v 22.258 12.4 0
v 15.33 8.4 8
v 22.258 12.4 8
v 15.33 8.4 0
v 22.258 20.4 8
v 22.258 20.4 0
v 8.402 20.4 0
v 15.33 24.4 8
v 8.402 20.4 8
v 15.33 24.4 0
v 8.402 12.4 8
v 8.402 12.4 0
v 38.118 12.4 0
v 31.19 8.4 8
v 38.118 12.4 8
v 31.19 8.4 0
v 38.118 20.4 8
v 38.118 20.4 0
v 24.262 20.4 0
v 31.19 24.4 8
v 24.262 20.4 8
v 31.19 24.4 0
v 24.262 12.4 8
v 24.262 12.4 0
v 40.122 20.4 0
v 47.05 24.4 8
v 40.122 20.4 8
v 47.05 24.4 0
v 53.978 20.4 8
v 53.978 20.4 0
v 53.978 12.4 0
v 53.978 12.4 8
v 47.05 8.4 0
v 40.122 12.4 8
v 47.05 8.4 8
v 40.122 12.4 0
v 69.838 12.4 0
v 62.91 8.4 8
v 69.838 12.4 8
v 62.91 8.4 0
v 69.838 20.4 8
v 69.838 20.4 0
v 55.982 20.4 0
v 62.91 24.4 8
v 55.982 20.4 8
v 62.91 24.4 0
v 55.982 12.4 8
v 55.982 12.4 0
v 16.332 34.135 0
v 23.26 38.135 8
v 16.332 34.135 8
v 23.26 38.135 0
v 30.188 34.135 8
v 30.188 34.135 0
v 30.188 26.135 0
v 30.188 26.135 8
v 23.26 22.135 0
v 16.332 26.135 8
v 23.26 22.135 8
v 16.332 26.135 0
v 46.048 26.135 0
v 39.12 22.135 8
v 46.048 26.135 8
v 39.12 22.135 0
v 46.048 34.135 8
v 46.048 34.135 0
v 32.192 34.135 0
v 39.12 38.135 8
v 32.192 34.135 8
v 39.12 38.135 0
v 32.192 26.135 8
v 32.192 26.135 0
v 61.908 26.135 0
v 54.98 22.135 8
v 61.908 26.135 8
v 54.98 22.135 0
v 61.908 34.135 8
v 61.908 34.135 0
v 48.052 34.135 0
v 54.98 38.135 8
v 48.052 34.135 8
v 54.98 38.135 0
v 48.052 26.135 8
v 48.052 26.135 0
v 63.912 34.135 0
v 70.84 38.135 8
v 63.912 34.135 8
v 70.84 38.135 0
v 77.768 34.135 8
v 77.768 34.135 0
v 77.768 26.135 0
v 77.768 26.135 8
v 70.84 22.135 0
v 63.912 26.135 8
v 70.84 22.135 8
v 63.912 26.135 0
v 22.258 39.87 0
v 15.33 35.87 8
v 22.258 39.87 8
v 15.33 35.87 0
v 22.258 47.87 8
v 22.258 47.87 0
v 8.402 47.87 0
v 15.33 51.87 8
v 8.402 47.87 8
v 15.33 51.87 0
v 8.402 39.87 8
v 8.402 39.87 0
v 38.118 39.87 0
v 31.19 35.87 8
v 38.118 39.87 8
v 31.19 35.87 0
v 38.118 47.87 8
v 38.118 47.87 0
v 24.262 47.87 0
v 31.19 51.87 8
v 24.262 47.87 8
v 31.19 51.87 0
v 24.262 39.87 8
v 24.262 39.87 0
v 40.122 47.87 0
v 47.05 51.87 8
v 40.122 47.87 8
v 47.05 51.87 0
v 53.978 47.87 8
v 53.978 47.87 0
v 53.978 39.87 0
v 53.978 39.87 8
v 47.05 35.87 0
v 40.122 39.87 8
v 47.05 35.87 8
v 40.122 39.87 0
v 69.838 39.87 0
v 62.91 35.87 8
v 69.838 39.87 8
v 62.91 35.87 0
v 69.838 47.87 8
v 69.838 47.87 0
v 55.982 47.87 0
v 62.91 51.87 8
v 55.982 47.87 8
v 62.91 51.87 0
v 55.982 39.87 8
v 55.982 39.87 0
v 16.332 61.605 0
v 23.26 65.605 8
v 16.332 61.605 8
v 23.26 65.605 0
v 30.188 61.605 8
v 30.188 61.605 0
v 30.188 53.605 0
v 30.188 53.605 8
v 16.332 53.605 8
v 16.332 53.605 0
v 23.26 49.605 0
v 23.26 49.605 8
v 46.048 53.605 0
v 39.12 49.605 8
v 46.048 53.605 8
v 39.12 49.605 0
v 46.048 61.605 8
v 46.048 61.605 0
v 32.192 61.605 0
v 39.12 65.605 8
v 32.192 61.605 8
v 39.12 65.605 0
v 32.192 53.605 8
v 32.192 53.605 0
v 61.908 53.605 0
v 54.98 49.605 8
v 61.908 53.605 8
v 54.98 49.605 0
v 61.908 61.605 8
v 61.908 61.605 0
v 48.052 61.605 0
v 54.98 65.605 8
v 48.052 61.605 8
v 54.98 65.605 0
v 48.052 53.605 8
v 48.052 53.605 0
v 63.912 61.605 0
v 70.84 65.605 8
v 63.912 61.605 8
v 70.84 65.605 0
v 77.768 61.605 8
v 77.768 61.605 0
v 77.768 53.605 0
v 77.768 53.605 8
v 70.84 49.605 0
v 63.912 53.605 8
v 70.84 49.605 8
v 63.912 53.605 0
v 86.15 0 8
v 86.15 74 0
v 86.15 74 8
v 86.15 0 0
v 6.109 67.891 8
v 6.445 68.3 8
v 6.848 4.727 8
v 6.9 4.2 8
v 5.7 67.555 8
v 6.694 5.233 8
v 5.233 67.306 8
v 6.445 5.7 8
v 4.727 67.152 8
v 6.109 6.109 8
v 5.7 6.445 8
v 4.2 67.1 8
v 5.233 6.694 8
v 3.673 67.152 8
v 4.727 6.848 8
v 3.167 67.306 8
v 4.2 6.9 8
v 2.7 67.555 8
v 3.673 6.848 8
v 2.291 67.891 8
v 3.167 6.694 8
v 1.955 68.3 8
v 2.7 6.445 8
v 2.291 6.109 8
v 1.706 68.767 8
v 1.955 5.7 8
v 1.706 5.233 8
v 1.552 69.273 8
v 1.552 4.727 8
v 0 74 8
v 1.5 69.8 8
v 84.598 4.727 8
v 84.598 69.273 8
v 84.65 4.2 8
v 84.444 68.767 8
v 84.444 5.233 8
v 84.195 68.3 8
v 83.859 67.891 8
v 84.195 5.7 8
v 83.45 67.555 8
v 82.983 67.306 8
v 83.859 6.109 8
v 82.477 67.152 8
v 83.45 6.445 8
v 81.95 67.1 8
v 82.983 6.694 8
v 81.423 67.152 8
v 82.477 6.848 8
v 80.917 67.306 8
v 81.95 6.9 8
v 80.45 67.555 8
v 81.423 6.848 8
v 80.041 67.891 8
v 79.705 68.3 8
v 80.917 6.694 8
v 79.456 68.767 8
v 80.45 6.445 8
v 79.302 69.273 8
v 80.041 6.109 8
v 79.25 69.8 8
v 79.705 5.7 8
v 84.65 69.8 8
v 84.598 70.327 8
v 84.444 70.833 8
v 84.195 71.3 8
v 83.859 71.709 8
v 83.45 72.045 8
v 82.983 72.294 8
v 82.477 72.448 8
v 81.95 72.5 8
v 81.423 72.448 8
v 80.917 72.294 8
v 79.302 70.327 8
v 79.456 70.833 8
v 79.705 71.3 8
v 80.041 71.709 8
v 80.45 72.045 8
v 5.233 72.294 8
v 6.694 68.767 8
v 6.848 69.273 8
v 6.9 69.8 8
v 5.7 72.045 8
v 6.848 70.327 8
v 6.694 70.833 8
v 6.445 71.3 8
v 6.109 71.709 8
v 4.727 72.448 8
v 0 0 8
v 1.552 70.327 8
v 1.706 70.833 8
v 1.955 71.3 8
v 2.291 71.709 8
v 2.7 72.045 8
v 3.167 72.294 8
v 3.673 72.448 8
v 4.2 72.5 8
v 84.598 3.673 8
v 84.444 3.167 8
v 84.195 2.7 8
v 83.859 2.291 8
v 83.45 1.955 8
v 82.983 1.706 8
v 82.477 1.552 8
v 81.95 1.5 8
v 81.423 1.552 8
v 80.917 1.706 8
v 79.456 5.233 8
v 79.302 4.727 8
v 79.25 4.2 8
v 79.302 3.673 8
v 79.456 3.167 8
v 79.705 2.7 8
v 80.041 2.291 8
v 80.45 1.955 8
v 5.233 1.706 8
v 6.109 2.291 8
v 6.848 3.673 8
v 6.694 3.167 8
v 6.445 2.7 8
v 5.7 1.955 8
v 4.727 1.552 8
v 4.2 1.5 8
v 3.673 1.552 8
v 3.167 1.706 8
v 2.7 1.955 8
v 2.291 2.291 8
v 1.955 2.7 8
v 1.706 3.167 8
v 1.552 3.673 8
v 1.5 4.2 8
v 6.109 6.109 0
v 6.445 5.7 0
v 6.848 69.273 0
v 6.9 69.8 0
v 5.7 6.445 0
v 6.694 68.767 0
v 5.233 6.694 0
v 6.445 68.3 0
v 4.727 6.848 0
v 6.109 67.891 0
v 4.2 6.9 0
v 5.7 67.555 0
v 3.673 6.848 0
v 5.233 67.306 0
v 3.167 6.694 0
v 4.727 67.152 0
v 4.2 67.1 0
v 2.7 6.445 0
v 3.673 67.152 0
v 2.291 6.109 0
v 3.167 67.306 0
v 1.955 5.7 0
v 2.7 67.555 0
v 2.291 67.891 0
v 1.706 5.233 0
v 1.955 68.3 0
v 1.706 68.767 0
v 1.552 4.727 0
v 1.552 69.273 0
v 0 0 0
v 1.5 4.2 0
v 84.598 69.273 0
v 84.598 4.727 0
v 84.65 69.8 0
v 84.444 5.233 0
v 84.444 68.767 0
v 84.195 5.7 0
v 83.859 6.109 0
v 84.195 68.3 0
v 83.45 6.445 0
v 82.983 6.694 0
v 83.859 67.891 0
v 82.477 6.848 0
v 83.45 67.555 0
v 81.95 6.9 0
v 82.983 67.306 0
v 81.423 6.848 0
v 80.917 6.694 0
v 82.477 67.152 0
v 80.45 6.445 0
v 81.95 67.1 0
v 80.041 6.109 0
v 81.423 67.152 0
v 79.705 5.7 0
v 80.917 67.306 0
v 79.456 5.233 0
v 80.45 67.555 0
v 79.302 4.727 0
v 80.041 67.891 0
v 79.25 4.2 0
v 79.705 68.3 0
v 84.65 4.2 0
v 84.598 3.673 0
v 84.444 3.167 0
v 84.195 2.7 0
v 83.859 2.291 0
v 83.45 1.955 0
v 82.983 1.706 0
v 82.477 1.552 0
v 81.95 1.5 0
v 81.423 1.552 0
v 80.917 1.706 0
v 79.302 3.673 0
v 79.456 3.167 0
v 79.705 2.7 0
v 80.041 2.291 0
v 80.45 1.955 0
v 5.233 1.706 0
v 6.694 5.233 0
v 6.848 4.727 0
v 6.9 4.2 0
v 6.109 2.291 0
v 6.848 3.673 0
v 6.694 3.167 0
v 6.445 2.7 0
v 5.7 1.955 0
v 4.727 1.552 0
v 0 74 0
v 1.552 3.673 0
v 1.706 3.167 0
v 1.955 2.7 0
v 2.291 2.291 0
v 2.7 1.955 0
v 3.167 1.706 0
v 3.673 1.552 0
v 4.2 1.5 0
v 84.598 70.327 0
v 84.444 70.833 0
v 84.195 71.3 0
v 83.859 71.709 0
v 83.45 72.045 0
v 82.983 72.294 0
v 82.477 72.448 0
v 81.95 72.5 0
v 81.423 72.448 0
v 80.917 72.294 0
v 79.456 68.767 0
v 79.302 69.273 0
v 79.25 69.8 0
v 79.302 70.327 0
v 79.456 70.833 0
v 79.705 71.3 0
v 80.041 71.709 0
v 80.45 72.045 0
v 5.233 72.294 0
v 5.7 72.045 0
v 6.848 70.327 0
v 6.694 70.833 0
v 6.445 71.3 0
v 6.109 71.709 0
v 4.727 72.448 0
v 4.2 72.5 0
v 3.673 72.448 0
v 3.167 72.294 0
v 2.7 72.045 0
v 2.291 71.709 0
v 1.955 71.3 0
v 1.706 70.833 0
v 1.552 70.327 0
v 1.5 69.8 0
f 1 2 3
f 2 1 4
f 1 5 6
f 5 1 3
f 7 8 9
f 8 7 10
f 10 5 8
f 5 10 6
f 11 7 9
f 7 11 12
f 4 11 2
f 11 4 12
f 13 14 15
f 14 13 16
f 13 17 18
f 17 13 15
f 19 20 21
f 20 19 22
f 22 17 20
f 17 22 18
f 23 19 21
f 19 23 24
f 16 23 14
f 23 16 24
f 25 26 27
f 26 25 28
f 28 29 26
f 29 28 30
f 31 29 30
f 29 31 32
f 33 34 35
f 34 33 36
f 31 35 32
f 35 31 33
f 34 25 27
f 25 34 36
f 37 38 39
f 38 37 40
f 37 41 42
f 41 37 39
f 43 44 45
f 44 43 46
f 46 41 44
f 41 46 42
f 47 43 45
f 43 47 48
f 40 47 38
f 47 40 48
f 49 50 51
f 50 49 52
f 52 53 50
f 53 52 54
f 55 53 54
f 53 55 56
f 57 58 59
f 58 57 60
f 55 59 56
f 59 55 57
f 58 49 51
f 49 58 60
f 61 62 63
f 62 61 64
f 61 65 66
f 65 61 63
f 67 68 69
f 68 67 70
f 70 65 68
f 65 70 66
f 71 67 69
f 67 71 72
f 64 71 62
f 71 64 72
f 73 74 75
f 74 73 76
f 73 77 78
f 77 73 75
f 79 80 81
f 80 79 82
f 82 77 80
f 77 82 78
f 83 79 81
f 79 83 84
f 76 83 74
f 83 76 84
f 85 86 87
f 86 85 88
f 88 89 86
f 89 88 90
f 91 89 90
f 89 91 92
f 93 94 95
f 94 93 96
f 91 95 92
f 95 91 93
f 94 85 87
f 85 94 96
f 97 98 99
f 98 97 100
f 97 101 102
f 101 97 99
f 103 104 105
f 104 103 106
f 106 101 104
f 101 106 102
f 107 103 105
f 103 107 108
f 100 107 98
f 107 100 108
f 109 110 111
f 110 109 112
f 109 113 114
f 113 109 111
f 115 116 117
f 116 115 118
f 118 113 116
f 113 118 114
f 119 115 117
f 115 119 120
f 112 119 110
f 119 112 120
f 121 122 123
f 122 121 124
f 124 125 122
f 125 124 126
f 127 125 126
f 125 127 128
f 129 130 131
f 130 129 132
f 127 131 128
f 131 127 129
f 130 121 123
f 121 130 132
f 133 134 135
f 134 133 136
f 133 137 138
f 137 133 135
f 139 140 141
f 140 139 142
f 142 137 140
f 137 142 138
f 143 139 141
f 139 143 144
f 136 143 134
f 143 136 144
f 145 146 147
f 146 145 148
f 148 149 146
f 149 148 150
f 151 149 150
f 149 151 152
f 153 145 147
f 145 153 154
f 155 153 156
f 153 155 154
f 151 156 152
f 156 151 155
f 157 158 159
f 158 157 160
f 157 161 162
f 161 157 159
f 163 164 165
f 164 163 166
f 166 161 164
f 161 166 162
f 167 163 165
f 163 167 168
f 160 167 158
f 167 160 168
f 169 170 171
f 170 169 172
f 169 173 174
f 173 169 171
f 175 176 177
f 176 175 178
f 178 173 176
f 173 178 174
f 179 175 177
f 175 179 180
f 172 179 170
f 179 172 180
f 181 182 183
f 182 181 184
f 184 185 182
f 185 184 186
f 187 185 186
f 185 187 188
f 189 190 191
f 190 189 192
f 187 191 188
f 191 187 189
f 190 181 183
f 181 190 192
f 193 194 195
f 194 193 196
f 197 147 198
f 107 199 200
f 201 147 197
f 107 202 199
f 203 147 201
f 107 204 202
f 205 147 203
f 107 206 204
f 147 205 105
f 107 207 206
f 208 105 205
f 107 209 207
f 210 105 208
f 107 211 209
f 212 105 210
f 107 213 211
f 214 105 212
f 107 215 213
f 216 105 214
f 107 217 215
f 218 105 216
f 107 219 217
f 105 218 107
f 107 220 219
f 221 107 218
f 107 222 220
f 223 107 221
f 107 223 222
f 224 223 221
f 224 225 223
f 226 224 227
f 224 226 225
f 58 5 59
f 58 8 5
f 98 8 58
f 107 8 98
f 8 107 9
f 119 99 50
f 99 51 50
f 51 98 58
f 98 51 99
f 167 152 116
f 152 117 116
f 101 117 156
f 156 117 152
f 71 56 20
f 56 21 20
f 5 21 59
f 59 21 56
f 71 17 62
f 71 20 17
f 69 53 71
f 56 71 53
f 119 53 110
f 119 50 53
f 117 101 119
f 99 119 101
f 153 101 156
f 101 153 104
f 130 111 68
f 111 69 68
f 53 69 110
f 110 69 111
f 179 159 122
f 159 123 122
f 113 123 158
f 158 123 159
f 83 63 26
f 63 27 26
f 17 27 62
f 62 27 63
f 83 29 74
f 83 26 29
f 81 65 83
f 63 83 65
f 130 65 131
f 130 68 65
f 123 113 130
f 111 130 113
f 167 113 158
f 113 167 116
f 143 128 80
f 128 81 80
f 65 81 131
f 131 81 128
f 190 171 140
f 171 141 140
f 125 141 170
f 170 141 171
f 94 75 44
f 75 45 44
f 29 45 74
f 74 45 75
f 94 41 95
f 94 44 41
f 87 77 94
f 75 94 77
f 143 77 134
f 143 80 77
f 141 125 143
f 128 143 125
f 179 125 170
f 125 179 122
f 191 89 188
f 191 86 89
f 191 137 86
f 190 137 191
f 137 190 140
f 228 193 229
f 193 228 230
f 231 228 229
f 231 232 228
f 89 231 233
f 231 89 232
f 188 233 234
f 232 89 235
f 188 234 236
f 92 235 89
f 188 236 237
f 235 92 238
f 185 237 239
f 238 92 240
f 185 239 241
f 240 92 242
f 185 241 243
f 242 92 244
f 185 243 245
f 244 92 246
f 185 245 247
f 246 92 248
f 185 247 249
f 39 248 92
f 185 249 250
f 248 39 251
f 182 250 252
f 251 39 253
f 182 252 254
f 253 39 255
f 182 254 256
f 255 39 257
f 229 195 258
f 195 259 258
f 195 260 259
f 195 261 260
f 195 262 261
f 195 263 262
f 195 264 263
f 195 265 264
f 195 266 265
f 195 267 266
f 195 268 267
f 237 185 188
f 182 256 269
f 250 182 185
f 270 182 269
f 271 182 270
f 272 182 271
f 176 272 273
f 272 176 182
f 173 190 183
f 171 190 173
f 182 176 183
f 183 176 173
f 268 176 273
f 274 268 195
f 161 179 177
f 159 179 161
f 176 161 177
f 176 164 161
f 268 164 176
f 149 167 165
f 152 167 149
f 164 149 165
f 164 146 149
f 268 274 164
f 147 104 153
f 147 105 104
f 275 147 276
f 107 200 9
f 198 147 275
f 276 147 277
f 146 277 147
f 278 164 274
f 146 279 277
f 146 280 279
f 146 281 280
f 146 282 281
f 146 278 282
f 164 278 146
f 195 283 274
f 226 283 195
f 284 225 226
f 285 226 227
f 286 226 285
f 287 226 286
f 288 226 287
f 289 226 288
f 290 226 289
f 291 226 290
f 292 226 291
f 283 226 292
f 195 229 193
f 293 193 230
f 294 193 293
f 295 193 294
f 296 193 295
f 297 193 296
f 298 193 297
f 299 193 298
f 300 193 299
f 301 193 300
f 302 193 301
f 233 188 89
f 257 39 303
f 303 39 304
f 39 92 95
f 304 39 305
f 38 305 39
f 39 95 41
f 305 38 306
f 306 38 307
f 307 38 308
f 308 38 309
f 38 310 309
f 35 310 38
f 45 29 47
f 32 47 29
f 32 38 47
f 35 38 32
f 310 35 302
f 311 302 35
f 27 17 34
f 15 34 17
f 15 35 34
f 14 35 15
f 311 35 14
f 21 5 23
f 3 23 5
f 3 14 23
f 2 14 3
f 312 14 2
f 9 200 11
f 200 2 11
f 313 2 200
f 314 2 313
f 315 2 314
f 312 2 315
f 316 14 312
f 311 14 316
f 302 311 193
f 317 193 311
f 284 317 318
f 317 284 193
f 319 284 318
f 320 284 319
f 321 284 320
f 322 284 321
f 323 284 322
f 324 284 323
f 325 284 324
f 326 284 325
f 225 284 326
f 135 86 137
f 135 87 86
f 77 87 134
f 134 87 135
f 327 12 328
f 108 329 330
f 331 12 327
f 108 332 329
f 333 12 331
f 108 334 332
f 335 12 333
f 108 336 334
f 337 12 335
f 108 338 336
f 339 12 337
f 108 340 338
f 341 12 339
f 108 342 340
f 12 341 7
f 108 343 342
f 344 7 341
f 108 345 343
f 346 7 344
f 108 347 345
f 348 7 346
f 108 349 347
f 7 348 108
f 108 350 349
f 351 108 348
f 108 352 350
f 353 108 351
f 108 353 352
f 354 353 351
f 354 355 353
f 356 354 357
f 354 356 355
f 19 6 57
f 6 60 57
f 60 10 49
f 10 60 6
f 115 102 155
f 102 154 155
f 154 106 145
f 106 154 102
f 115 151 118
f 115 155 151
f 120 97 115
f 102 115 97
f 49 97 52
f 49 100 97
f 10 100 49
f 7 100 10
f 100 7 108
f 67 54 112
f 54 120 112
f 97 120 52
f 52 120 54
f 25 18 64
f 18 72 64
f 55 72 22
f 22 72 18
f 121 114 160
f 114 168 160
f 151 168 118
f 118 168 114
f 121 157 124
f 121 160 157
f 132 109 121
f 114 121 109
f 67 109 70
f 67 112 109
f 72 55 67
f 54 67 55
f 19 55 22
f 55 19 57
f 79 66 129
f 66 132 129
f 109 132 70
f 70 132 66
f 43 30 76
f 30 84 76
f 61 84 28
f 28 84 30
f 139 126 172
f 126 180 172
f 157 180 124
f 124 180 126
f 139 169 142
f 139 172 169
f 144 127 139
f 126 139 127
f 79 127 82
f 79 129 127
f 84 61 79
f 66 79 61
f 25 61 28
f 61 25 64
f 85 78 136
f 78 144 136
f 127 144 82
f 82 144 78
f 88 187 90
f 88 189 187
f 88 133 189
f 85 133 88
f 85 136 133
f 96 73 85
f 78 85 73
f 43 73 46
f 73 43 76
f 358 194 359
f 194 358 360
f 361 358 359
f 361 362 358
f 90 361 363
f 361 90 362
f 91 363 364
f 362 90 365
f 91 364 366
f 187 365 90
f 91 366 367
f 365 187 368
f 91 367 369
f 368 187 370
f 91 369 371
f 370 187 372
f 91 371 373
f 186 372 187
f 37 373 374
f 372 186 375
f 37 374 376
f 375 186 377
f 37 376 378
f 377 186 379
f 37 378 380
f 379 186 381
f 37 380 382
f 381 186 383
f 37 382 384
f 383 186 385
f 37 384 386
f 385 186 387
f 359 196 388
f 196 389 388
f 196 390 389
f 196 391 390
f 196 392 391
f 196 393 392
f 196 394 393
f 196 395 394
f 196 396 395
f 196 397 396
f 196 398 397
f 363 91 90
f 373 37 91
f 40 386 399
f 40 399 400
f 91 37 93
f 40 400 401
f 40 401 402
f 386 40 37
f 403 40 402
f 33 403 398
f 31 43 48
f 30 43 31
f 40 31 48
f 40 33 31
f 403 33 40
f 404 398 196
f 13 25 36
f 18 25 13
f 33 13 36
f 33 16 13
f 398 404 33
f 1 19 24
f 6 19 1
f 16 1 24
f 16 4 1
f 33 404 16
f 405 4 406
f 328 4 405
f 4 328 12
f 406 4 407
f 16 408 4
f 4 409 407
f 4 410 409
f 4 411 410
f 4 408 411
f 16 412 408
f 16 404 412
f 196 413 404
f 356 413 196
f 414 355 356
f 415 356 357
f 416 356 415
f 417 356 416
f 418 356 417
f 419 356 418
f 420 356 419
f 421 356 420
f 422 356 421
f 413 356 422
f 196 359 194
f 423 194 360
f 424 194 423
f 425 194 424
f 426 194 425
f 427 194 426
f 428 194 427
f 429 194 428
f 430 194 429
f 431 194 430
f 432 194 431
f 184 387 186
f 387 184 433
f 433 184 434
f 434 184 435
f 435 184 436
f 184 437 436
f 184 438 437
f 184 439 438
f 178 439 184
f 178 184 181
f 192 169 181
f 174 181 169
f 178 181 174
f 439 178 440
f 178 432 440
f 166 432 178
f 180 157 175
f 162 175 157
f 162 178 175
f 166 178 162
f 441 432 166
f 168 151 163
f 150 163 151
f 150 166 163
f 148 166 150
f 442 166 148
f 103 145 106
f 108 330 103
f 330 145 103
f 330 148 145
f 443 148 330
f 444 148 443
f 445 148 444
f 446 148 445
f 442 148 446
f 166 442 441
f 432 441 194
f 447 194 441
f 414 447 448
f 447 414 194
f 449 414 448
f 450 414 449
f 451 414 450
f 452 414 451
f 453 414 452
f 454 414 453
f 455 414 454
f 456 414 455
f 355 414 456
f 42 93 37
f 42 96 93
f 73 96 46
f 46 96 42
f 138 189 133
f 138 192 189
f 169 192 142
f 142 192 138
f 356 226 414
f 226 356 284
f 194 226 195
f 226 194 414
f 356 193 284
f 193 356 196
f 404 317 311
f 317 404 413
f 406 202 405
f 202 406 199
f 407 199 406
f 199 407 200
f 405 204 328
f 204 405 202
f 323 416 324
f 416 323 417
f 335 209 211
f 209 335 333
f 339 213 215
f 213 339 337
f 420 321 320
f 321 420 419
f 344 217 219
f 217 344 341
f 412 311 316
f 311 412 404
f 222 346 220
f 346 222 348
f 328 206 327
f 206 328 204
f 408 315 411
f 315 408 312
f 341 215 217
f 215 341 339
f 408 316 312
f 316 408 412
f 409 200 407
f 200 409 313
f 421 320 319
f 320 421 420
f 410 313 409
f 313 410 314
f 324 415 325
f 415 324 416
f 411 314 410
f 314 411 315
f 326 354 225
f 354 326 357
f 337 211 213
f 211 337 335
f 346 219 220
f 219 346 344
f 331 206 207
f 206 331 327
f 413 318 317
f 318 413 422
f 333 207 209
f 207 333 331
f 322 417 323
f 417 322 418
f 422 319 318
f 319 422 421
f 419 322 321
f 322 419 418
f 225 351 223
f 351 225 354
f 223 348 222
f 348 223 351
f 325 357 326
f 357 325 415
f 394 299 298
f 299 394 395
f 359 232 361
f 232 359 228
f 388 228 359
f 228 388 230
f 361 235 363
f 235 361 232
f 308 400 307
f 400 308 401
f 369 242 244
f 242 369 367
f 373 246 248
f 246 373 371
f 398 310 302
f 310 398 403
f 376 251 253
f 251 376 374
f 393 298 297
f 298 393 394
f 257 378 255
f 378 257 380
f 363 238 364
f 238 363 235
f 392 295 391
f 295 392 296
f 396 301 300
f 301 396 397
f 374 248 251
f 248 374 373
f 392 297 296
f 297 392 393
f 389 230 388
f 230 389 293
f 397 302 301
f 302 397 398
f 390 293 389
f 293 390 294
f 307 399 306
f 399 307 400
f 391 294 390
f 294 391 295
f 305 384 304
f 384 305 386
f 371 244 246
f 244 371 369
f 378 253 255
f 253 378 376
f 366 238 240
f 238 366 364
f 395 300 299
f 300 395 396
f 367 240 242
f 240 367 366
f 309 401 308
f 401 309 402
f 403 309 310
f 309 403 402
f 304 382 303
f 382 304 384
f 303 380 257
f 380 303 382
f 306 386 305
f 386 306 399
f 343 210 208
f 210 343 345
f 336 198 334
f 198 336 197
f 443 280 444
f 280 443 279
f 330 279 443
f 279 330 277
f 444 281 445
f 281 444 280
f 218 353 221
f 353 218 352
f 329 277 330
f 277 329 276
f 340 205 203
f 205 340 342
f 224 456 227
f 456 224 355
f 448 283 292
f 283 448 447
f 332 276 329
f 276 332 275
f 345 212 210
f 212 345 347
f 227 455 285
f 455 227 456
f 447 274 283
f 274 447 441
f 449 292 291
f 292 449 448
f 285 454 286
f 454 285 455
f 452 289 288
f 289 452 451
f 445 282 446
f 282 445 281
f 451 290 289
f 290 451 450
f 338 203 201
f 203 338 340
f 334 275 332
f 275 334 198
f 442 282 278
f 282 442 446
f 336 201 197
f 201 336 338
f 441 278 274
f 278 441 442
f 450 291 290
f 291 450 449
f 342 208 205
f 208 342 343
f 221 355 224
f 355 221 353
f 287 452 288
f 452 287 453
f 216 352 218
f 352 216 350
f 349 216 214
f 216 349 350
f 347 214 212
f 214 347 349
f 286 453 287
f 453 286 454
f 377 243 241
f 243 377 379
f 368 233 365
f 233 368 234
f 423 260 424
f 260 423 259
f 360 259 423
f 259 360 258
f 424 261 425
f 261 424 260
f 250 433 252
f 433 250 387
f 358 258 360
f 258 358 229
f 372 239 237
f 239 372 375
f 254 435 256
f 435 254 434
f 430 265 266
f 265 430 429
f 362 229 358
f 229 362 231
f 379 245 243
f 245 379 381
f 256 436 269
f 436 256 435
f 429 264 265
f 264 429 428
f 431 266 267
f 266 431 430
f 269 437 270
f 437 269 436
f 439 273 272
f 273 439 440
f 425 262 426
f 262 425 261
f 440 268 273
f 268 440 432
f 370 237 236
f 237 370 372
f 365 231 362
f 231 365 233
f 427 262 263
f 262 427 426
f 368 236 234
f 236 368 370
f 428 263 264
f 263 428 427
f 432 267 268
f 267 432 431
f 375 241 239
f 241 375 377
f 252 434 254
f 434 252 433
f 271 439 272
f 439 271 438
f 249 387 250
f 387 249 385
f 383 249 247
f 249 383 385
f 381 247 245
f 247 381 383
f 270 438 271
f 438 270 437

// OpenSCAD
$fn = 32;

// ----------------------------------------------------------------------
// Honeycomb panel: 86.15 x 74 mm, 16 cells of 16 mm
// ----------------------------------------------------------------------

// --- parameters (mm) ---
panel_w = 86.15;          // panel width
panel_d = 74;             // panel depth
thick = 8;                // panel thickness
cell_r = 8;               // hex cell circumradius
pitch = 15.86;            // hex cell pitch (centre to centre)
web = 2;                  // web between the cells
columns = 4;              // columns of cells
rows = 4;                 // rows of cells
cell_count = 16;          // total cells
shift_x = 15.33;          // first cell offset in x
shift_y = 16.4;           // first cell offset in y
mount_d = 5.4;            // corner mounting holes
hole_off = 4.2;           // mounting hole offset from the corners

difference() {
  union() {
    cube([panel_w, panel_d, thick]);
  }
  /* hexagonal cells, point-up, cut right through the plate */
  for (row = [0 : rows - 1]) {
    for (col = [0 : columns - 1]) {
      translate([shift_x + col * pitch + (row % 2) * pitch / 2, shift_y + row * pitch * 0.866025, -2.5]) rotate([0, 0, 30]) cylinder(h = thick + 5, d = 2 * cell_r, $fn = 6);
    }
  }
  /* corner mounting holes, clear of the outer cell web */
  translate([4.2, 4.2, -2.5]) cylinder(h = thick + 5, d = mount_d);
  translate([81.95, 4.2, -2.5]) cylinder(h = thick + 5, d = mount_d);
  translate([4.2, 69.8, -2.5]) cylinder(h = thick + 5, d = mount_d);
  translate([81.95, 69.8, -2.5]) cylinder(h = thick + 5, d = mount_d);
}
